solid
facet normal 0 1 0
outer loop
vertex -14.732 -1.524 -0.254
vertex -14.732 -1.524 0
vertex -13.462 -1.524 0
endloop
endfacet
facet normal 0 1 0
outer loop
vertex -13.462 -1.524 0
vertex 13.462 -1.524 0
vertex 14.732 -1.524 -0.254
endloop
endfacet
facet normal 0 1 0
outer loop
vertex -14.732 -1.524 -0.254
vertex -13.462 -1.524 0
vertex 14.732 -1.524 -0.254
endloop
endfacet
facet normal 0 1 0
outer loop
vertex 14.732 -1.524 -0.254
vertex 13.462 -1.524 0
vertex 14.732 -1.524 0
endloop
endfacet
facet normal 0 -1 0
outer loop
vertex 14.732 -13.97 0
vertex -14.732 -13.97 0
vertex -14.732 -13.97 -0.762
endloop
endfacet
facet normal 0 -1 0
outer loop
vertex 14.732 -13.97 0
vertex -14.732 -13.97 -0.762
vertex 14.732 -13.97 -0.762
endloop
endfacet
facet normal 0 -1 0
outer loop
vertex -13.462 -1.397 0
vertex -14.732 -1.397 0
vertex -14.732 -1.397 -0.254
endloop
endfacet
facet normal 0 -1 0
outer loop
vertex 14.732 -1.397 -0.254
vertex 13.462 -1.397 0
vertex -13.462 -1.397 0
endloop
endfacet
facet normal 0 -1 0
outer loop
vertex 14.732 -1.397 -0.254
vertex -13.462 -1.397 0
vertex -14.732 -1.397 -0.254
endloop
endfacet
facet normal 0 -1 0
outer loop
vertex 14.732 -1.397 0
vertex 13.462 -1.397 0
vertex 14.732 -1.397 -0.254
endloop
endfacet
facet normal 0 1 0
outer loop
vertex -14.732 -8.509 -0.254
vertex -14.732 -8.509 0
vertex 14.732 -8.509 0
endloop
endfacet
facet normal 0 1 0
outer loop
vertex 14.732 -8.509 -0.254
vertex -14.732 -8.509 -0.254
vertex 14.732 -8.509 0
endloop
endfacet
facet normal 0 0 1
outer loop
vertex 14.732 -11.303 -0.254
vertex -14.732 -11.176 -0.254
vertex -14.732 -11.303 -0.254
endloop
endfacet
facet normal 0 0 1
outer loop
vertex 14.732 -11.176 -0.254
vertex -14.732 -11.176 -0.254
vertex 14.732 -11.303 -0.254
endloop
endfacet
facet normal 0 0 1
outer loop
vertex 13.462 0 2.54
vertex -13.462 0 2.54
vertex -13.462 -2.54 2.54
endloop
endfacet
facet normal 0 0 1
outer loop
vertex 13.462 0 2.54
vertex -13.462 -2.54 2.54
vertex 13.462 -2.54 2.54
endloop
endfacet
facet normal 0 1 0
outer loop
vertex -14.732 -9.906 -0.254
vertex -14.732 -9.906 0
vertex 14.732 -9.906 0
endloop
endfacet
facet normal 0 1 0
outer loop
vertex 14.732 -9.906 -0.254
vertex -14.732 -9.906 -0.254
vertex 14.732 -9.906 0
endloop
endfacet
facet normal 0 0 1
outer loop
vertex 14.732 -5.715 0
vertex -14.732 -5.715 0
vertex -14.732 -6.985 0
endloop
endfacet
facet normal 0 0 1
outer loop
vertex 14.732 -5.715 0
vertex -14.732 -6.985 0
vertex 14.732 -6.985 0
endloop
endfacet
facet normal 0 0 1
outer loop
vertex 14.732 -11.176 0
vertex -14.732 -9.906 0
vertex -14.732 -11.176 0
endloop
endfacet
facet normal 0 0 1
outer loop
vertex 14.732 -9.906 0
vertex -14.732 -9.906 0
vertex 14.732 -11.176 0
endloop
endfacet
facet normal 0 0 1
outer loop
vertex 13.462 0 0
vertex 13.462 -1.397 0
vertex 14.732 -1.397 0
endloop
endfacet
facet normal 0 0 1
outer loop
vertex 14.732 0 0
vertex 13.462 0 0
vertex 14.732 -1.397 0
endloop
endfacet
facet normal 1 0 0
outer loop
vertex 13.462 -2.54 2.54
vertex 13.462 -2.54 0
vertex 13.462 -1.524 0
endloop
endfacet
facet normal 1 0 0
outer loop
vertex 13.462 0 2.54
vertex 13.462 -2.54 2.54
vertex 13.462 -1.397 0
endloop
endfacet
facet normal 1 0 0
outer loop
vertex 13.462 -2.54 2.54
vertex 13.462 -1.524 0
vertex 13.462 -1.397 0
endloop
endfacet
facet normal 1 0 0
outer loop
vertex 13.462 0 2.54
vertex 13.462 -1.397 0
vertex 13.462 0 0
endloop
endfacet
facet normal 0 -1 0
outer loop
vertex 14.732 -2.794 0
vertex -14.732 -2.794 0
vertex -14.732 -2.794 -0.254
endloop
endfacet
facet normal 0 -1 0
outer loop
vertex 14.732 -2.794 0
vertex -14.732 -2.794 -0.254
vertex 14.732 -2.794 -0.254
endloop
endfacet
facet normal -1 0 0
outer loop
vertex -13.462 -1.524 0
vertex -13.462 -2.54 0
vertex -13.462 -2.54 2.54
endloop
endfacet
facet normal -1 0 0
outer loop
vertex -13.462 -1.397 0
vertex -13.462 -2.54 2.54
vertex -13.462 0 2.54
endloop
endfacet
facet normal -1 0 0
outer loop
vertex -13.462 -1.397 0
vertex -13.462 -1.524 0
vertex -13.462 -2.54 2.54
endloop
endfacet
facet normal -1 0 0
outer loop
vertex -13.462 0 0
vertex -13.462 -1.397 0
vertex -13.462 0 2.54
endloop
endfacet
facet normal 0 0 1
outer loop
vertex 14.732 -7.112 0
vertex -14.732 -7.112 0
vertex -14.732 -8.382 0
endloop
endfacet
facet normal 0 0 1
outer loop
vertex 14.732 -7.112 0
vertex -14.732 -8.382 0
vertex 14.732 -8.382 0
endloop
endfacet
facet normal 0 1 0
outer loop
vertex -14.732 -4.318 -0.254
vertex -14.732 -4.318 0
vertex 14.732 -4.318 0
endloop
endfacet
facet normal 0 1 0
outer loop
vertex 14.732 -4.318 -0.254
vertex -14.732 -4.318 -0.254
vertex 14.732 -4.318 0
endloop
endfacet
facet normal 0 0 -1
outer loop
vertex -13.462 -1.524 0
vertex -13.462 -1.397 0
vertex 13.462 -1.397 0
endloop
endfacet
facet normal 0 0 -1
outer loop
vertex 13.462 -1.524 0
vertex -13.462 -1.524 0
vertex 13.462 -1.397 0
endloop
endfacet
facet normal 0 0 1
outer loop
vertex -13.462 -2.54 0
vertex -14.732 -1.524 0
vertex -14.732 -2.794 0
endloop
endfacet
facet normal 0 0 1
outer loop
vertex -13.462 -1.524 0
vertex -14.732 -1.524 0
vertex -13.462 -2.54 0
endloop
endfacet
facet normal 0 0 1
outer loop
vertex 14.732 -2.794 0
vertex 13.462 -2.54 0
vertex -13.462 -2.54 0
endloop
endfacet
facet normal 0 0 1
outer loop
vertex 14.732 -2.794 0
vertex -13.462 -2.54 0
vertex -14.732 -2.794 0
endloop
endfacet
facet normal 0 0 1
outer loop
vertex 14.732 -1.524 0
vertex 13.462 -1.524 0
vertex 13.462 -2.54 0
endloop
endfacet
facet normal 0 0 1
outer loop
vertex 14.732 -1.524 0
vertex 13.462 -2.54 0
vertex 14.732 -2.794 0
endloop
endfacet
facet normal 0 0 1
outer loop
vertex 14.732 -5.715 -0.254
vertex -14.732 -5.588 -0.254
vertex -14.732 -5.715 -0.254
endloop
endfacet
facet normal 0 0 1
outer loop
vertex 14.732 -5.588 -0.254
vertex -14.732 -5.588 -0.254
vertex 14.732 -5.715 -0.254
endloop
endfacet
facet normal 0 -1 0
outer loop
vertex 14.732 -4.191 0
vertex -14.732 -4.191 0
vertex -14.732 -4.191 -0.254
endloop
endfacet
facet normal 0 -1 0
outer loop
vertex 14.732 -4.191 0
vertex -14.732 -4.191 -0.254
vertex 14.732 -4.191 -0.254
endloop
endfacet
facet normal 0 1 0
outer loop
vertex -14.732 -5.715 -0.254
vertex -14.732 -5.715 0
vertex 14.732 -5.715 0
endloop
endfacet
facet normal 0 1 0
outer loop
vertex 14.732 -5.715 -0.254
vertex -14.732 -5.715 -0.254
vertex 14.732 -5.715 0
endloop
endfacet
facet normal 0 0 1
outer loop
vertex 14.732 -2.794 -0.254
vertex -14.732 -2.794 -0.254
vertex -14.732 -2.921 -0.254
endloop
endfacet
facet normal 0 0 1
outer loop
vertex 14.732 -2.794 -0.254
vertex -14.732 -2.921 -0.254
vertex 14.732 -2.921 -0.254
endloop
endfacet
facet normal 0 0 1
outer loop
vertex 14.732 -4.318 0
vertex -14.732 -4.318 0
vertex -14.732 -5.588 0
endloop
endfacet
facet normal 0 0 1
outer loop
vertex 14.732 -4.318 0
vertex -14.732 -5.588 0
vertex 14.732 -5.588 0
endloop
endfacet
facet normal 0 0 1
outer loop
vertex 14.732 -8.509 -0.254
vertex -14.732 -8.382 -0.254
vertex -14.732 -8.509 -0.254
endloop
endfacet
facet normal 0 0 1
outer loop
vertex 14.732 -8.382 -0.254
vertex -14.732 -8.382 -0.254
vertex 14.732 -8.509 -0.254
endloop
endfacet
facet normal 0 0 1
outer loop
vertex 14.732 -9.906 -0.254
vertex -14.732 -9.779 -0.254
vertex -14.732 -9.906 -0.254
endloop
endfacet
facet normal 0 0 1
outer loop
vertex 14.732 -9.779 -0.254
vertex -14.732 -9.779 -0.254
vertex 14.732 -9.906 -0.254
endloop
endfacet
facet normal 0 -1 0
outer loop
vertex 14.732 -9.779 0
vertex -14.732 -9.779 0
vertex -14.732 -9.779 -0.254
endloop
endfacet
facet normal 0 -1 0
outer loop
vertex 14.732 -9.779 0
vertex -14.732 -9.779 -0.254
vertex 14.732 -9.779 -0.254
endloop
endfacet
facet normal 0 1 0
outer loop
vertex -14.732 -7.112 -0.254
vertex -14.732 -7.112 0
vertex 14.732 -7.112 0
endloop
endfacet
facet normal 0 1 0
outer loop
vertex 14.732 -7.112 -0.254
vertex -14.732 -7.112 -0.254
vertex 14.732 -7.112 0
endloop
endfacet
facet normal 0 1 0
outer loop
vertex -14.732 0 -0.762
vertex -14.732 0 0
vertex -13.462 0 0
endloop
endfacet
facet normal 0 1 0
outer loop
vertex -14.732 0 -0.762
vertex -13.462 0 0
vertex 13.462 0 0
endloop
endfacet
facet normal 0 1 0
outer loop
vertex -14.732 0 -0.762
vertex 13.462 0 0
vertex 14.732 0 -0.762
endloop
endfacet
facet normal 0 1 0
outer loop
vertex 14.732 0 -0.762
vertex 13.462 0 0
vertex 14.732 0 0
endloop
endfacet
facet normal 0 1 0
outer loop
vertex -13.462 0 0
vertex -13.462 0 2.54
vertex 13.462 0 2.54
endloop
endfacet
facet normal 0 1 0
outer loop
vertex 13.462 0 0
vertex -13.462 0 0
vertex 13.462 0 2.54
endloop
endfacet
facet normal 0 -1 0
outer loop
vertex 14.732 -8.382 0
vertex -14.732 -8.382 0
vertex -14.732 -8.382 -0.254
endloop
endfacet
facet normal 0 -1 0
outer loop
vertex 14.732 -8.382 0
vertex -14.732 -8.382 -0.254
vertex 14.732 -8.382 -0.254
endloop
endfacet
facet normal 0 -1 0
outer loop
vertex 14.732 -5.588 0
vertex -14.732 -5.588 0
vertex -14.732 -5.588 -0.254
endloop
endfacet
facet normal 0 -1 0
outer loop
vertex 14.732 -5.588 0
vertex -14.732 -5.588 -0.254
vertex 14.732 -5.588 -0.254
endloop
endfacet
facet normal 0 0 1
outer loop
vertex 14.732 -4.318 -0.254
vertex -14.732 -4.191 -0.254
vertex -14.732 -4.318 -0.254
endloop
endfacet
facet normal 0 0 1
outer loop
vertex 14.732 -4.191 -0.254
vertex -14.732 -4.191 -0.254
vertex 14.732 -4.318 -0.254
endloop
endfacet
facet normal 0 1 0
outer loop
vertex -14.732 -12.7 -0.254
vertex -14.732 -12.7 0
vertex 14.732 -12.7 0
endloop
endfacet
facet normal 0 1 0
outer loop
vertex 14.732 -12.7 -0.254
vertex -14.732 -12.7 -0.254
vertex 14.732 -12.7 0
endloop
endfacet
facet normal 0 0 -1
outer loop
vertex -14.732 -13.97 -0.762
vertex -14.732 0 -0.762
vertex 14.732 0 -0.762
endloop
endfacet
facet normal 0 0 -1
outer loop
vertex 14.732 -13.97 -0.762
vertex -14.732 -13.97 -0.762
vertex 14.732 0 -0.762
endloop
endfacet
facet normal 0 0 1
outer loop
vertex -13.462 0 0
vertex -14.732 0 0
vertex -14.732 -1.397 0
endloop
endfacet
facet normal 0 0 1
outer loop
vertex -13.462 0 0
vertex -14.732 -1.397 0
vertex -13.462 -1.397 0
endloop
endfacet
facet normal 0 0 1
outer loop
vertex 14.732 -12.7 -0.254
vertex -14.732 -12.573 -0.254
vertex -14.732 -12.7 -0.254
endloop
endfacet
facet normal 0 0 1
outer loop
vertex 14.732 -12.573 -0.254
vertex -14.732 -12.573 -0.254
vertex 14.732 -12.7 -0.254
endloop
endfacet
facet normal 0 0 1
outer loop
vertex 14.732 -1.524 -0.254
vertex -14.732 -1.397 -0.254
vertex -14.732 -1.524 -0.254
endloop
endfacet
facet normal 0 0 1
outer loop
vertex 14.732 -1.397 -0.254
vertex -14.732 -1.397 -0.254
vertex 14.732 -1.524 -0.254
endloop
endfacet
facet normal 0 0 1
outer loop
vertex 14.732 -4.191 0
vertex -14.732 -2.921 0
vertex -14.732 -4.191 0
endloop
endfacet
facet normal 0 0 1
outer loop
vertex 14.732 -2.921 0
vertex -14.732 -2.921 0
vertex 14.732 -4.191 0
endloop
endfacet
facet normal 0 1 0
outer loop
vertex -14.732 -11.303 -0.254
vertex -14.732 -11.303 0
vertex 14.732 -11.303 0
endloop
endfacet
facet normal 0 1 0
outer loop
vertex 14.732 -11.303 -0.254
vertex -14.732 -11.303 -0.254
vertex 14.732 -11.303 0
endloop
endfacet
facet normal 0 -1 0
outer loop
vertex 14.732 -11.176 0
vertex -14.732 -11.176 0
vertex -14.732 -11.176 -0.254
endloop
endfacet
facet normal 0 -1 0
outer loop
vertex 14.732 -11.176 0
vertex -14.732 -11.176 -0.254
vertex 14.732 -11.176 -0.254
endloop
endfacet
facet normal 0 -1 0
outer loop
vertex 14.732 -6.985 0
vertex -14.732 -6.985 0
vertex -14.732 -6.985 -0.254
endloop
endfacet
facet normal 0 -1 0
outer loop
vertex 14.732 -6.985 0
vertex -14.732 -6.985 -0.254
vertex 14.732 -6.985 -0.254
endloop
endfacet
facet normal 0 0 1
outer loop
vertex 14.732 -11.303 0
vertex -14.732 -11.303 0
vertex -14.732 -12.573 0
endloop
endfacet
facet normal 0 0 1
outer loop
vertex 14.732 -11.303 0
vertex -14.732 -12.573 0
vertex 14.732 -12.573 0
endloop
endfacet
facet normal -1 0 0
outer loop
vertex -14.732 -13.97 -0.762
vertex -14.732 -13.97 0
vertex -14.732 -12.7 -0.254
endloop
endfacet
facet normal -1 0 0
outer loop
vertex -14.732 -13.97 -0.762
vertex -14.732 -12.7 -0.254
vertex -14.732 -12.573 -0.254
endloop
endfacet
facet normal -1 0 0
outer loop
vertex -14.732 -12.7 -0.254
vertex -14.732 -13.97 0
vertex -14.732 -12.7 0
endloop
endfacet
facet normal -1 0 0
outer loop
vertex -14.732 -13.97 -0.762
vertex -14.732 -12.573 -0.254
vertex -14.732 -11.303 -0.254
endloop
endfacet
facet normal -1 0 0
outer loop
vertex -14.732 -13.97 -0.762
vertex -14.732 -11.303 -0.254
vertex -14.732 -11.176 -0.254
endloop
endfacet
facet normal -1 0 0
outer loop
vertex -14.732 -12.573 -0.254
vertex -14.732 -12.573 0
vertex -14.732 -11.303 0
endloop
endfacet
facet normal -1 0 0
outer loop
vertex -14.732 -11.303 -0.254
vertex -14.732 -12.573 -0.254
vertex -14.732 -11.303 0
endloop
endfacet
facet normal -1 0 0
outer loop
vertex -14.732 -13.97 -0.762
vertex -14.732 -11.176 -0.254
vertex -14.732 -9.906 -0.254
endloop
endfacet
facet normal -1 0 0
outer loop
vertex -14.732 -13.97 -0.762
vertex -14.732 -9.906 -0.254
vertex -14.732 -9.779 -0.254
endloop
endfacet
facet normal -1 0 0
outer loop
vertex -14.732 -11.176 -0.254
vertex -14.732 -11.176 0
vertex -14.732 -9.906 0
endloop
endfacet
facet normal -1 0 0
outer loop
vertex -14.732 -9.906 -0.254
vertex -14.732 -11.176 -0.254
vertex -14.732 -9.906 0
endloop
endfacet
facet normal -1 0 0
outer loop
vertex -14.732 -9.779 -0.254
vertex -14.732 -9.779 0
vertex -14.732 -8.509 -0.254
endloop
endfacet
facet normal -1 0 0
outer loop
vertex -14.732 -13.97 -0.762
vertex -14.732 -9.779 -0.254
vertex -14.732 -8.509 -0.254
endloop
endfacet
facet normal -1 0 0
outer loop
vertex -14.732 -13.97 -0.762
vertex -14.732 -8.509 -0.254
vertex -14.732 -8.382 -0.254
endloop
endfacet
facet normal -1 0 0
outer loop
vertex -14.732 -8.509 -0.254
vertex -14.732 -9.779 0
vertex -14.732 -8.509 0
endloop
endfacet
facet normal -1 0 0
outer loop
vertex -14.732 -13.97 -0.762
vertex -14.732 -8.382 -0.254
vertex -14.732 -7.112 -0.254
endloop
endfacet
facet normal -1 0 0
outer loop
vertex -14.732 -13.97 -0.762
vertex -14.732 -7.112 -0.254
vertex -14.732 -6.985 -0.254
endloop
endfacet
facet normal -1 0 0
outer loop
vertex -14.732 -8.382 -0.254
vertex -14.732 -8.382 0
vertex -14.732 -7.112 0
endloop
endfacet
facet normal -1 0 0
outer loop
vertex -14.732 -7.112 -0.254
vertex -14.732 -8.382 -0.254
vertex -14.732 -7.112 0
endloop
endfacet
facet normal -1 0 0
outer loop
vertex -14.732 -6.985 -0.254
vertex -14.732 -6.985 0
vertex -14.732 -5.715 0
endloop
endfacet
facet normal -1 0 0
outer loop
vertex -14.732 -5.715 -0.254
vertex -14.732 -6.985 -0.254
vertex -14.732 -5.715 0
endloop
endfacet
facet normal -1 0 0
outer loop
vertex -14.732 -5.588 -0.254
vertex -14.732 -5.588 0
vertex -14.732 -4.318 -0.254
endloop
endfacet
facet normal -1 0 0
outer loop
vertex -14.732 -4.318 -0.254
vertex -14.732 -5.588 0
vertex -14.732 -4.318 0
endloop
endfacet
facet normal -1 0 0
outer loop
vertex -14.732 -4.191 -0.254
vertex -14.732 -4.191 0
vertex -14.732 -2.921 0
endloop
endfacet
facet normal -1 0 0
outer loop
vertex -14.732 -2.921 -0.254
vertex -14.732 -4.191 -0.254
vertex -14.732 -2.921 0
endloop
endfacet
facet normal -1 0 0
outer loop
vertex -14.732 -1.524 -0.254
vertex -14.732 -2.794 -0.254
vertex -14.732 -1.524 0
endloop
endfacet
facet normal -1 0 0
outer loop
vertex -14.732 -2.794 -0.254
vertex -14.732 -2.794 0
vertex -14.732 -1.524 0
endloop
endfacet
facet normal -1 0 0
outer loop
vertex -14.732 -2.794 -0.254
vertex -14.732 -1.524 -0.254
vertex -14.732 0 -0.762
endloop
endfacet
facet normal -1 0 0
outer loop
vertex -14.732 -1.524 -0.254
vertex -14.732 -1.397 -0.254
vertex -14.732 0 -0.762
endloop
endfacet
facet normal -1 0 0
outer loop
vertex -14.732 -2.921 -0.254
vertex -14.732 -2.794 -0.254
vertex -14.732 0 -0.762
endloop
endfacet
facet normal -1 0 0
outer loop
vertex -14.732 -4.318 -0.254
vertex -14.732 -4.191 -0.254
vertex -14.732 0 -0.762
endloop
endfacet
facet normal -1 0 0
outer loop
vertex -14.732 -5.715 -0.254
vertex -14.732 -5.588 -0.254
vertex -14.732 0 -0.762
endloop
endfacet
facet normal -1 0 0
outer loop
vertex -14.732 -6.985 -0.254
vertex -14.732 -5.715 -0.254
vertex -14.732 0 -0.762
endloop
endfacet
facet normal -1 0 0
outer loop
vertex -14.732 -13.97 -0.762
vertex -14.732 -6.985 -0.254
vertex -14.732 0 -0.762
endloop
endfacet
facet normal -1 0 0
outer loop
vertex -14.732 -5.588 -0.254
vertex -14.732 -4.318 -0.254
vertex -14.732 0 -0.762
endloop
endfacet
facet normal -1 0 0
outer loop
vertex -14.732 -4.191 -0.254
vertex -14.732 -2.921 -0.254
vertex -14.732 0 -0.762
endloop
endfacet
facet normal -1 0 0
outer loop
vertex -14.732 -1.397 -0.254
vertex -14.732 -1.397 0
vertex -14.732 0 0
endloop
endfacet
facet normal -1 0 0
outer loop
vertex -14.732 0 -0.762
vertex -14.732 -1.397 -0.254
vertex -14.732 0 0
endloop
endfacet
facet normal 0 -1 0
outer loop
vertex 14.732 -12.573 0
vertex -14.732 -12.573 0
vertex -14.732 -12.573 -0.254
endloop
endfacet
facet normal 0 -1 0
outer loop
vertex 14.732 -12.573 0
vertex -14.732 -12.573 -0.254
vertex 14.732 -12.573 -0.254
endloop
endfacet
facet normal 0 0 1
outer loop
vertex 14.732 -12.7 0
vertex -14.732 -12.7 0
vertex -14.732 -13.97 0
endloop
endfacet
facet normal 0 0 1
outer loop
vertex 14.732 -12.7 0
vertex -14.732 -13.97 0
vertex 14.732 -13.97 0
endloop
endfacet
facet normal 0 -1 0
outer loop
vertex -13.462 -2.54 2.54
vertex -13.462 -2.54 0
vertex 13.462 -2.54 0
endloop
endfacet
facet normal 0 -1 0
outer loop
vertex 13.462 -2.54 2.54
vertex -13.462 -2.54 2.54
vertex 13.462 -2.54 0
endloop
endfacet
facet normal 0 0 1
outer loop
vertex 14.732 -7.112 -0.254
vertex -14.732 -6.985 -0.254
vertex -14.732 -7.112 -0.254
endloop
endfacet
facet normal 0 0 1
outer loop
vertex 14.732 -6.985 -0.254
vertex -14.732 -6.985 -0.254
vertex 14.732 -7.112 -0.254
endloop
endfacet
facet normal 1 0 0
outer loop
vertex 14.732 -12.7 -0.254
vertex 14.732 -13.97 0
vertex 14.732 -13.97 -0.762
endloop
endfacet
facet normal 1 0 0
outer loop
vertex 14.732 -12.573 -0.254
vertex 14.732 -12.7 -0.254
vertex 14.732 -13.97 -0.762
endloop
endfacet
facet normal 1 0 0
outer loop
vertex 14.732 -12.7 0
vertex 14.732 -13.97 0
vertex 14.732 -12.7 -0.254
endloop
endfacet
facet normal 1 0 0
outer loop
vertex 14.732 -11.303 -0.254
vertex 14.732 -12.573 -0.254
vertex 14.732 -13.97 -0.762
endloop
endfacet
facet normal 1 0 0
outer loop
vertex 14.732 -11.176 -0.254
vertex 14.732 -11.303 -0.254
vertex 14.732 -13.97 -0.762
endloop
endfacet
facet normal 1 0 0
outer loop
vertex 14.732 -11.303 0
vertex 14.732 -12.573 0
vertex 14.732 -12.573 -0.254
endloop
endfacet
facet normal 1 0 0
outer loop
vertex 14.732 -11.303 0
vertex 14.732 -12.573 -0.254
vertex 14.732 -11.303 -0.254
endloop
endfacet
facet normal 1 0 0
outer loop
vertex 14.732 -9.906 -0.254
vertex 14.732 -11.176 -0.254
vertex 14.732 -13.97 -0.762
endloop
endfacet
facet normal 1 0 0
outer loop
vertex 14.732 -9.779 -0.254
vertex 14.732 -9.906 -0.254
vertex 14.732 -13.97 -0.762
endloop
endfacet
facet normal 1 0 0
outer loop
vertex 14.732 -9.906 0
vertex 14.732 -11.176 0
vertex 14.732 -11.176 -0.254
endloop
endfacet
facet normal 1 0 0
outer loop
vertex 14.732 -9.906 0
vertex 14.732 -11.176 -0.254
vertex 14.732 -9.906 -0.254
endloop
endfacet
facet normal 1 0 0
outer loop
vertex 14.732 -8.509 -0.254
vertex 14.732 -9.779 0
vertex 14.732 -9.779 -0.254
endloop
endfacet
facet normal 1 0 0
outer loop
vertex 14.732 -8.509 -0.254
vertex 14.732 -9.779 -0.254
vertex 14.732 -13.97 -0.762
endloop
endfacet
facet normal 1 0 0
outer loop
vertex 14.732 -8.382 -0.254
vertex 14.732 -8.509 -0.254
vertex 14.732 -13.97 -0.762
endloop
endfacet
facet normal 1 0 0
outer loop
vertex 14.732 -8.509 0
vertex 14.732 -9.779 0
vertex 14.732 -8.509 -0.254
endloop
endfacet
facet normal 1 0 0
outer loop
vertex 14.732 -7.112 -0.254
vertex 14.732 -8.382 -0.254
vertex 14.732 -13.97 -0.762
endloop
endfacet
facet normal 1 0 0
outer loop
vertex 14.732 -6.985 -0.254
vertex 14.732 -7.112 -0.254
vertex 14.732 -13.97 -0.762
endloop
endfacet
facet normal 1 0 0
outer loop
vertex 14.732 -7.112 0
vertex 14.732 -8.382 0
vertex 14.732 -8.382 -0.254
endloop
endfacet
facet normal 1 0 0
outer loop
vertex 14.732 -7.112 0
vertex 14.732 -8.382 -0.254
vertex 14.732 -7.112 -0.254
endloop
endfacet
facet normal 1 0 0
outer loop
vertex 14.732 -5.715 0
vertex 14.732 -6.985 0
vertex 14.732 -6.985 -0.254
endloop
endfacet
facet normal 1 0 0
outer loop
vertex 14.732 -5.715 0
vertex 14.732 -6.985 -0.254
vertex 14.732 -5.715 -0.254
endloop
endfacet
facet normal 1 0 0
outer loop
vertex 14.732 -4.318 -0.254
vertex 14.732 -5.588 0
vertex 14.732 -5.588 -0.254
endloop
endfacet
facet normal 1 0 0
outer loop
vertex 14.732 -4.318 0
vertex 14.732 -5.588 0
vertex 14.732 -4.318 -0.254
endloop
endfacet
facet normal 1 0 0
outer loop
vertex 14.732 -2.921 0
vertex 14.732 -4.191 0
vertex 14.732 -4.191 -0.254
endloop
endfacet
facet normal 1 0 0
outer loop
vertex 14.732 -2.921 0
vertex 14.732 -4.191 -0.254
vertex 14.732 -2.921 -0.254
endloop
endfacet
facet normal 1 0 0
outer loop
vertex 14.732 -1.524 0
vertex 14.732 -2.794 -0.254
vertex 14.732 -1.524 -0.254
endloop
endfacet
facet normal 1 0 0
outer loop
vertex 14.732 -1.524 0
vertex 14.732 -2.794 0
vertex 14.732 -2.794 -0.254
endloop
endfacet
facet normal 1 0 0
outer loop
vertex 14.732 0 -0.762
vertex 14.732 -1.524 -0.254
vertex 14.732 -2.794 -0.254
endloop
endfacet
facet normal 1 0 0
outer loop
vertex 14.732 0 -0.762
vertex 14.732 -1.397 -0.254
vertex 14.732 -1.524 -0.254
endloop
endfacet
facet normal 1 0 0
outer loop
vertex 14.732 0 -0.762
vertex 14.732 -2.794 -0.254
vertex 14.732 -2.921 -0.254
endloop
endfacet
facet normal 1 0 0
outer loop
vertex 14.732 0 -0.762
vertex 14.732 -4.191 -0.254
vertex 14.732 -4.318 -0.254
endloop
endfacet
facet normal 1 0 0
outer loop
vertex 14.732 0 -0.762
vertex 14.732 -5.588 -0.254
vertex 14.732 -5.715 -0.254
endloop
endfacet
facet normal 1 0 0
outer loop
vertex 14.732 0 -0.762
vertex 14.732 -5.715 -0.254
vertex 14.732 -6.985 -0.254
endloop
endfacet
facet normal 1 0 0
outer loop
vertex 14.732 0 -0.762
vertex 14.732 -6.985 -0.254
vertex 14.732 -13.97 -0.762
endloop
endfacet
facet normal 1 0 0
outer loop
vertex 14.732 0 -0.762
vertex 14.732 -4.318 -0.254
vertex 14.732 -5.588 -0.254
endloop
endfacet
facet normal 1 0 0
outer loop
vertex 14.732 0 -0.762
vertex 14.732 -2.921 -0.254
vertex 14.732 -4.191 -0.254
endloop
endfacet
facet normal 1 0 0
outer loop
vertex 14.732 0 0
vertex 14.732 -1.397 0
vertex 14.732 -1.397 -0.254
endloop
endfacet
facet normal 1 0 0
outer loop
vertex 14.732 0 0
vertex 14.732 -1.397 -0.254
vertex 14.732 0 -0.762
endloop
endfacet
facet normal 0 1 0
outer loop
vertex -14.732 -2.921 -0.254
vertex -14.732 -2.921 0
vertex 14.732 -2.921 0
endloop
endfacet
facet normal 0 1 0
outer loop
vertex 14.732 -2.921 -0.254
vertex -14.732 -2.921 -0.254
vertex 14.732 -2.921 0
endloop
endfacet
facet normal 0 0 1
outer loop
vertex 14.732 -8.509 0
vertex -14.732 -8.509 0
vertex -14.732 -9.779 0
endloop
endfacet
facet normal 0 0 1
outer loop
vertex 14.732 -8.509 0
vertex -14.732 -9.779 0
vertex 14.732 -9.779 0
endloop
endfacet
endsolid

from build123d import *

# Parameters (mm, degrees)
F0_W     = 26.924
F0_H     = 2.54
F1_DEPTH = 2.54
F2_W     = 29.464
F2_H     = 13.97
F3_DEPTH = 0.762
F4_W     = 29.464
F4_H     = 0.127
F5_DEPTH = 0.254


with BuildPart() as f1:
    # F0 (on Top) → F1 (new body)
    with BuildSketch(Plane.XY):
        with Locations((0, -1.27)):
            Rectangle(F0_W, F0_H)
    extrude(amount=F1_DEPTH)

    # F2 (on Top) → F3 (join)
    with BuildSketch(Plane.XY):
        with Locations((0, -6.985)):
            Rectangle(F2_W, F2_H)
    extrude(amount=-F3_DEPTH)

    # F4 (on face) → F5 (cut)
    with BuildSketch(Plane.XY):
        with Locations((0, -12.6365)):
            Rectangle(F4_W, F4_H)
        with Locations((0, -11.2395)):
            Rectangle(F4_W, F4_H)
        with Locations((0, -9.8425)):
            Rectangle(F4_W, F4_H)
        with Locations((0, -8.4455)):
            Rectangle(F4_W, F4_H)
        with Locations((0, -7.0485)):
            Rectangle(F4_W, F4_H)
        with Locations((0, -5.6515)):
            Rectangle(F4_W, F4_H)
        with Locations((0, -4.2545)):
            Rectangle(F4_W, F4_H)
        with Locations((0, -2.8575)):
            Rectangle(F4_W, F4_H)
        with Locations((0, -1.4605)):
            Rectangle(F4_W, F4_H)
    extrude(amount=-F5_DEPTH, mode=Mode.SUBTRACT)


solid = f1.part
